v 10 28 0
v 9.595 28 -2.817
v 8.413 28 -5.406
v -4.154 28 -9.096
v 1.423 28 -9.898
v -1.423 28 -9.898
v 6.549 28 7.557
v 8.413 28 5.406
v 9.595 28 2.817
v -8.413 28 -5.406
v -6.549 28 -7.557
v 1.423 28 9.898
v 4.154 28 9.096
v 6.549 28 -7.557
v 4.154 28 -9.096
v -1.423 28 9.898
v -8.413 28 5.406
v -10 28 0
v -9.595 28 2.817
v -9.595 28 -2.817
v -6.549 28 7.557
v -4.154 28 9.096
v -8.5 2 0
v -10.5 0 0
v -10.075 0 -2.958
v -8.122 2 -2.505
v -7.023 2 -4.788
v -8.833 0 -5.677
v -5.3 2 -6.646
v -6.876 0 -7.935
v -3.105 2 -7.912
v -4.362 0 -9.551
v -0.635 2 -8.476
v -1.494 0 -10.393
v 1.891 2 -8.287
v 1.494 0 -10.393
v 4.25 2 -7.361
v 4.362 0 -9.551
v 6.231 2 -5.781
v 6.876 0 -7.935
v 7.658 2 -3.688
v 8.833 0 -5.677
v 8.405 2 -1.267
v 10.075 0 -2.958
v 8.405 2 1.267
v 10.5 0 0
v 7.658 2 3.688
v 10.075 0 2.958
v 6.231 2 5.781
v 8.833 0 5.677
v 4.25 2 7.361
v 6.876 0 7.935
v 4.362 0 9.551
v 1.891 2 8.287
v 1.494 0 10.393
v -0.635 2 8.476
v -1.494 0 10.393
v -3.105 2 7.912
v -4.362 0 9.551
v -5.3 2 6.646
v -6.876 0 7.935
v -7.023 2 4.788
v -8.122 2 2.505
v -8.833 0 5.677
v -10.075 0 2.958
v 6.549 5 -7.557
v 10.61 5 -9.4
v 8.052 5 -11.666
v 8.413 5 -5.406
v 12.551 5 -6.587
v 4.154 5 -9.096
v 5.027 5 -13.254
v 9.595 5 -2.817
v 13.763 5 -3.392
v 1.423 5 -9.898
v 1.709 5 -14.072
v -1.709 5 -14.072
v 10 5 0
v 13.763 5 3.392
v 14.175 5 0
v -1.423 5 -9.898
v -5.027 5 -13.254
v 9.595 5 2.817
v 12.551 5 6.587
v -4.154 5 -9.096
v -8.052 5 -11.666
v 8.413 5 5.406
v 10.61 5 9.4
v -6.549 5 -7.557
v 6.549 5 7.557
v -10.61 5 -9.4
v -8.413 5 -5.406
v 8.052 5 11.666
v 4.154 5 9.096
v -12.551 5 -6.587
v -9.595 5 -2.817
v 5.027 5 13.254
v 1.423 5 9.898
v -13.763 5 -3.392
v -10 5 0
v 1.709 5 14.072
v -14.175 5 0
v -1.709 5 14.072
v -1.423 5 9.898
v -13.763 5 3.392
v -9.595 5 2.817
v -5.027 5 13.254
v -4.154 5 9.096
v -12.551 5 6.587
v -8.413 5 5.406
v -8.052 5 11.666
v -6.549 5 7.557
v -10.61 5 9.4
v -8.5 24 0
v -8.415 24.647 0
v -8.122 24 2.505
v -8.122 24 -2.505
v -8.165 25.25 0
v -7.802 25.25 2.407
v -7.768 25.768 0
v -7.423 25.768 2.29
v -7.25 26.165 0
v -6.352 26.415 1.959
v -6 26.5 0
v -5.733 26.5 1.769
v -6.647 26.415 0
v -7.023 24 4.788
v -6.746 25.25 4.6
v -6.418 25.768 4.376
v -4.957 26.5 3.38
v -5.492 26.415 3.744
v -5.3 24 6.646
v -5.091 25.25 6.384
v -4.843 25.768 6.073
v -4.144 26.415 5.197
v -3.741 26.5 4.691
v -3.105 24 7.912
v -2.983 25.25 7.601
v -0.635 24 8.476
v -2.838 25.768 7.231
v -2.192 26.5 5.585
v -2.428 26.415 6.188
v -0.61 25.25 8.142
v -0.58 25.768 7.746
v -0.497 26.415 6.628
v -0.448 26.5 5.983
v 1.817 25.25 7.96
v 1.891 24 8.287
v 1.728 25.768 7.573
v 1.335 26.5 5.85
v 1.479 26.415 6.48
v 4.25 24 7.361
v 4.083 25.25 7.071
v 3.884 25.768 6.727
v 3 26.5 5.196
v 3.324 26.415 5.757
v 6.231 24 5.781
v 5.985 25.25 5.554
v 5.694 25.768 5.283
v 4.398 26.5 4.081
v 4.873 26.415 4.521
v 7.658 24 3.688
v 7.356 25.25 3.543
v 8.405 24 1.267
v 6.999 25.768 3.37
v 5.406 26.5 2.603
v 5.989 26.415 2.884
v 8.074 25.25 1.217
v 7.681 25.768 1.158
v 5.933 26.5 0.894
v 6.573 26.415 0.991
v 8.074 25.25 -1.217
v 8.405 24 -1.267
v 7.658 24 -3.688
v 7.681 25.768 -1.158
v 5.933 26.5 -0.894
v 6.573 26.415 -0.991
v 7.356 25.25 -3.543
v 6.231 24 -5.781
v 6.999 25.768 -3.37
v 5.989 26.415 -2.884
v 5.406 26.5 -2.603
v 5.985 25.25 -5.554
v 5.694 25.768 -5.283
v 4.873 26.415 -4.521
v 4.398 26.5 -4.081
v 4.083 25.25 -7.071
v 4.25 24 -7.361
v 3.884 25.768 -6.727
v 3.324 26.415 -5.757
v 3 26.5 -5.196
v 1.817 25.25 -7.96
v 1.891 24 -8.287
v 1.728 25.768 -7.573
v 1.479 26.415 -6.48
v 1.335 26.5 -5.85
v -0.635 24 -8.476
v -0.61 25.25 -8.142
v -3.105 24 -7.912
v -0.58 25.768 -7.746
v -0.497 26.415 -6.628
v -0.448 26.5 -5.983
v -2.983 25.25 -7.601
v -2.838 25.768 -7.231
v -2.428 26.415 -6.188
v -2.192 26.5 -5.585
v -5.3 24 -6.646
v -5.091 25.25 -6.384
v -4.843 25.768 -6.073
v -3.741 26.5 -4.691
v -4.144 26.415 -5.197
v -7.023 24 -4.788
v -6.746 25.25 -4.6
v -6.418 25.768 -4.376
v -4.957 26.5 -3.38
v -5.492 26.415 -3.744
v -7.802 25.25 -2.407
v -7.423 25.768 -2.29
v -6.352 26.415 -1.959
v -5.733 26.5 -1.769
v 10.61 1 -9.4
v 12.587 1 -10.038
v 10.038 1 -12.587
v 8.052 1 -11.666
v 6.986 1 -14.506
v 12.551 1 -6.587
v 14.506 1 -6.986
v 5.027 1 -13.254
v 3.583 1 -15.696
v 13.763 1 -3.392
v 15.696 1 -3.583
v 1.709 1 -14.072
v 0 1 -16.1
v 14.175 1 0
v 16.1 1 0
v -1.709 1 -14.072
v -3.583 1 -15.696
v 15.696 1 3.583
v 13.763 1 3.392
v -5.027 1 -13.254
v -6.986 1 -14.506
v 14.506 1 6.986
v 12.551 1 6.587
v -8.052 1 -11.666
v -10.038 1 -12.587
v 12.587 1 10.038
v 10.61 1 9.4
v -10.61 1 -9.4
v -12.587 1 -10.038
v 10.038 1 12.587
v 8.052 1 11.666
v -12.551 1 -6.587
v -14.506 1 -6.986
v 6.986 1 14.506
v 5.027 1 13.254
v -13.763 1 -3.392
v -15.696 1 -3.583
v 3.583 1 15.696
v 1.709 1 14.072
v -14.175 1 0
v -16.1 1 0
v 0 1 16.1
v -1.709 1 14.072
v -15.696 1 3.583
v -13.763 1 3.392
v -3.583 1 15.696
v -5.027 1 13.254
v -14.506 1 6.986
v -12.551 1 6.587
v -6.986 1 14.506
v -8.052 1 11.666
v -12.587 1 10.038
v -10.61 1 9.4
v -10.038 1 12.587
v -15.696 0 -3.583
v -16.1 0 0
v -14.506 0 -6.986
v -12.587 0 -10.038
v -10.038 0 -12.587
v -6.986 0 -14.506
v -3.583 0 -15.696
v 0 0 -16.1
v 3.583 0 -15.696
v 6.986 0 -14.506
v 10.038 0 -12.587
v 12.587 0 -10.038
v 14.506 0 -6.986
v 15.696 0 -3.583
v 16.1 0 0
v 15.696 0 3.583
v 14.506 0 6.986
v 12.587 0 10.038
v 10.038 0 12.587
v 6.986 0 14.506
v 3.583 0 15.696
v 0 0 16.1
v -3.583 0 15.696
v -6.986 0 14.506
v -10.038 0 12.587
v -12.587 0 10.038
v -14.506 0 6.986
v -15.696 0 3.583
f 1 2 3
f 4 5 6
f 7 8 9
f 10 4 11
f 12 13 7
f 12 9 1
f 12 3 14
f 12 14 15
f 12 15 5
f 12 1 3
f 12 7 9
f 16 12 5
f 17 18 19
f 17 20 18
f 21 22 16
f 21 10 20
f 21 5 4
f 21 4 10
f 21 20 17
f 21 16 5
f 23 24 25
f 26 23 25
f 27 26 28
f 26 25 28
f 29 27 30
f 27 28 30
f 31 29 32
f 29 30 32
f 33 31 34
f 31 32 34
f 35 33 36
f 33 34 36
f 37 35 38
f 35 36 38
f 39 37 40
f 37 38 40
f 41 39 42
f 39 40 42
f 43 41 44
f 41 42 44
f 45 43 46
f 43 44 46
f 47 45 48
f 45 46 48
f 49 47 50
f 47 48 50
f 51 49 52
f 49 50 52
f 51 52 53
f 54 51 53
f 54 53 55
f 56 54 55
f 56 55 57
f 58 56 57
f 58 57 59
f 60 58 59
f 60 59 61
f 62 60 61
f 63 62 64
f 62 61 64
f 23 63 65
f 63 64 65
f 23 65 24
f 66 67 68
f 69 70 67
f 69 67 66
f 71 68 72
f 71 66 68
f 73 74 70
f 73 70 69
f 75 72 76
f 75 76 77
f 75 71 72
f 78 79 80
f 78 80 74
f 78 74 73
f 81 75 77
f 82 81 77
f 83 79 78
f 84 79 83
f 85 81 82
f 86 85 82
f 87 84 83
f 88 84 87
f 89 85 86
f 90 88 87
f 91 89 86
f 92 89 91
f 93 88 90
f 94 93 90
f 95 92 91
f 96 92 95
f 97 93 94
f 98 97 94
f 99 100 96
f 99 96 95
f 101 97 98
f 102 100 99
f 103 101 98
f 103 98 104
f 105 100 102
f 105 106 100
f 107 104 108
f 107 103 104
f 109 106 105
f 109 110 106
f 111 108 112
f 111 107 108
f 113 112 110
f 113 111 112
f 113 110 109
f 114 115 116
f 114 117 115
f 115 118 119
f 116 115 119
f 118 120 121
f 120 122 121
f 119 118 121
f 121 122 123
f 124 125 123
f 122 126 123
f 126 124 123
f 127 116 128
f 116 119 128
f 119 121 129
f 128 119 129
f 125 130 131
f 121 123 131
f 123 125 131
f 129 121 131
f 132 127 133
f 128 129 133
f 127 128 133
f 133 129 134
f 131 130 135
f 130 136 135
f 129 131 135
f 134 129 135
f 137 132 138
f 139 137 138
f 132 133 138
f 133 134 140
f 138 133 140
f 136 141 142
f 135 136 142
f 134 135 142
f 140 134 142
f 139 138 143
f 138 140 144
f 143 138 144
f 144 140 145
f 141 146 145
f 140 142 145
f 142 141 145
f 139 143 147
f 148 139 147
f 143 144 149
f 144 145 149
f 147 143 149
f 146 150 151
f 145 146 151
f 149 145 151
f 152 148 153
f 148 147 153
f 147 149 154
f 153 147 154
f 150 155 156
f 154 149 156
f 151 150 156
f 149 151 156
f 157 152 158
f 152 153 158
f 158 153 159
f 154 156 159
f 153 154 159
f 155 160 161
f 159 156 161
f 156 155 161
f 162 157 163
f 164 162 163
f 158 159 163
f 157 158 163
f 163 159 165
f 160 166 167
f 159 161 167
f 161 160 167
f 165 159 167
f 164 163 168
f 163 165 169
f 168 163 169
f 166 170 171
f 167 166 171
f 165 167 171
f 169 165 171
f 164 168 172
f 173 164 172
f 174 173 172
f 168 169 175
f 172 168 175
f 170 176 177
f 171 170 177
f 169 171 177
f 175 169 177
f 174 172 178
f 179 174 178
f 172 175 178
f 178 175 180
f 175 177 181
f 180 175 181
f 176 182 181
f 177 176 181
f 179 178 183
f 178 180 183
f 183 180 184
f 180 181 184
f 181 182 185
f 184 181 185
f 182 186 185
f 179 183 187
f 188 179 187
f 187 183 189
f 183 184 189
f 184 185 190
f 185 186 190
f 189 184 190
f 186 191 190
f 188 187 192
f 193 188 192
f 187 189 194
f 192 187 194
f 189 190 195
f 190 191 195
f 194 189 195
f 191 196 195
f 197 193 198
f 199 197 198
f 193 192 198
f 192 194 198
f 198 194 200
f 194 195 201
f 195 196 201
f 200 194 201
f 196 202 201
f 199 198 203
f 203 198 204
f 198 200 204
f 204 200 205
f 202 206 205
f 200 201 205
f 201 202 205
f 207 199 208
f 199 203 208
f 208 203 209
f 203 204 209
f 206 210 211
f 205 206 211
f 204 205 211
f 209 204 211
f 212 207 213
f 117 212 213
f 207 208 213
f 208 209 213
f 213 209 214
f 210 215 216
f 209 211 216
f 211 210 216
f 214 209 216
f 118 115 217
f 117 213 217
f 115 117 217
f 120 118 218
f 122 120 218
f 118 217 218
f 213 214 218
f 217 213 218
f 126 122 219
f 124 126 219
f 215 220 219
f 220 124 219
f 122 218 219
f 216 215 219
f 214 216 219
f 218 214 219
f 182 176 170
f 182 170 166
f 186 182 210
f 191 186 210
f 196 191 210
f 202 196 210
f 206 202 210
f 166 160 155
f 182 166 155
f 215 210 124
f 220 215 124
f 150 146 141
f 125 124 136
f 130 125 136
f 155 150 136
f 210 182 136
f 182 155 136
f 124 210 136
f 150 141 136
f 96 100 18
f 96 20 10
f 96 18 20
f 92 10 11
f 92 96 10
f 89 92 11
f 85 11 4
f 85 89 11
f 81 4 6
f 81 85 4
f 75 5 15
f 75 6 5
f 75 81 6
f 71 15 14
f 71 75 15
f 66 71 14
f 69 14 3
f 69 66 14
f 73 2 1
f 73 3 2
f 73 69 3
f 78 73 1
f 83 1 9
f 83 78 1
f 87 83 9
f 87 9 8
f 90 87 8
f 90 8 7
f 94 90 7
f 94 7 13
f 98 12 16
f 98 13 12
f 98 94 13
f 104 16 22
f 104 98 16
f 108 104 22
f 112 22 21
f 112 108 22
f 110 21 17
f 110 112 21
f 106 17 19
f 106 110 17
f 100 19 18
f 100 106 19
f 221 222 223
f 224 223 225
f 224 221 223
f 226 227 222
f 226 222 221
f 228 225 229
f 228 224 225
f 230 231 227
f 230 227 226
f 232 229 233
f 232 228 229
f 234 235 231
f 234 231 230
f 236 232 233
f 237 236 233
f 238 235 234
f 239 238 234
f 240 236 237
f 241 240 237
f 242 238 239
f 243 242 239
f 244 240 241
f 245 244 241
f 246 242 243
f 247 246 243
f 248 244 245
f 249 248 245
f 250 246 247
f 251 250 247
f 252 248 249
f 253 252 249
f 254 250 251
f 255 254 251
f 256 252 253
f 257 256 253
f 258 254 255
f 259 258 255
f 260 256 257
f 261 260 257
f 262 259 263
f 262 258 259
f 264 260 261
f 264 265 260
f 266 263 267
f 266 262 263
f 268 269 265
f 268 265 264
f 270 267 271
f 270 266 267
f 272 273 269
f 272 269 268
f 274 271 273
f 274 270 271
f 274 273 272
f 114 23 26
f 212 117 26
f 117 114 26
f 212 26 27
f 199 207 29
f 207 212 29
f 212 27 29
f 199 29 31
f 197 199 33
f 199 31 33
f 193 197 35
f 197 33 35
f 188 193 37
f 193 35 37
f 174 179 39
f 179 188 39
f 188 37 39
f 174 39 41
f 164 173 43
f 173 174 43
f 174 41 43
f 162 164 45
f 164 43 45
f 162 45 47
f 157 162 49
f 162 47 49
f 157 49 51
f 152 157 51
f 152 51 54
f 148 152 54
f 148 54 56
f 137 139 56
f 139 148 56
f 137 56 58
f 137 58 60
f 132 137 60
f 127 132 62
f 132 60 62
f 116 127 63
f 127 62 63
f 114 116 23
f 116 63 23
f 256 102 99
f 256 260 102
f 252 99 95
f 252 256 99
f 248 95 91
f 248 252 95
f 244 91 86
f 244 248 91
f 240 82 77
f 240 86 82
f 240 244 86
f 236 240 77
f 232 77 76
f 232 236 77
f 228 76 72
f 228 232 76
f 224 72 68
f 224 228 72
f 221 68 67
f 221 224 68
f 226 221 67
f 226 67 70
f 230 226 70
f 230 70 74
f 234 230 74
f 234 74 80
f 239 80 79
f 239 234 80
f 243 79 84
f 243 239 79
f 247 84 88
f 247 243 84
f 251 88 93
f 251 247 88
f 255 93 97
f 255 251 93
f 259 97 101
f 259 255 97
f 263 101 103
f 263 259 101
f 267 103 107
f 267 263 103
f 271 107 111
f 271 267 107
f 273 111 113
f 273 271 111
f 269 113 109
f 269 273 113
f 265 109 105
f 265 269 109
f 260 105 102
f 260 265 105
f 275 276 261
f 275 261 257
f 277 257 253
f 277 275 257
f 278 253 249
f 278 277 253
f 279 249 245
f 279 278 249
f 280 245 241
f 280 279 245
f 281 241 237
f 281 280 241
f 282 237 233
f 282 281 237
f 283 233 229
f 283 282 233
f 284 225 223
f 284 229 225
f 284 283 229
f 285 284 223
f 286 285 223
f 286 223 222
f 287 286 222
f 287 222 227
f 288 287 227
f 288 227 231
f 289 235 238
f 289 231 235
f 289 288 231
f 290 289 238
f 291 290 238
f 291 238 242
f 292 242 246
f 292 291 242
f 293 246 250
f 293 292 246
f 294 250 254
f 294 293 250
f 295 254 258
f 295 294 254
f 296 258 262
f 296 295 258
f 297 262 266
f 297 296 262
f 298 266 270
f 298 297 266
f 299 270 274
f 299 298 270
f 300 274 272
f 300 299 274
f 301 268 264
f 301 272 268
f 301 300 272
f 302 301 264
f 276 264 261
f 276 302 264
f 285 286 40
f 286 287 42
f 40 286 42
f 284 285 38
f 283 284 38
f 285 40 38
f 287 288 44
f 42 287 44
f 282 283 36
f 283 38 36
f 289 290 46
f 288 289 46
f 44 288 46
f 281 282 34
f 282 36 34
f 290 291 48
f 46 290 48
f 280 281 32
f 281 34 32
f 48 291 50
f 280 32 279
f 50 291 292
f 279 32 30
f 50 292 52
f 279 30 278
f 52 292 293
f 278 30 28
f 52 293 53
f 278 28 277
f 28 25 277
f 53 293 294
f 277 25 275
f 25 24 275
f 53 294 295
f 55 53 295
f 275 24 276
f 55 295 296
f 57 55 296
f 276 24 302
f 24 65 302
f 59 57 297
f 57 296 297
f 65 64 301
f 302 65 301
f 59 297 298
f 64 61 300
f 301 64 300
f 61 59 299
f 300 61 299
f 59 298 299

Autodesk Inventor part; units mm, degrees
ref_plane "YZ Plane" through (0, 0, 0) normal (1, 0, 0) x (0, 1, 0)
ref_plane "XZ Plane" through (0, 0, 0) normal (0, 1, 0) x (-1, 0, 0)
ref_plane "XY Plane" through (0, 0, 0) normal (0, 0, 1) x (1, 0, 0)
sketch "Náčrt1" plane through (0, 0, 0) normal (0, 1, 0) x (-1, 0, 0)
  circle A0 centre (0, 0) radius 16.1
  circle A1 centre (0, 0) radius 14.175
  circle A2 centre (0, 0) radius 10
  circle A3 centre (0, 0) radius 8.5
  dimension "d0" = 32.2
  dimension "d1" = 28.35
  dimension "d2" = 20
  dimension "d3" = 1.5
extrude "Vysunutí1" add sketch "Náčrt1" along normal blind 1 contours A0
extrude "Vysunutí2" add sketch "Náčrt1" along normal blind 5 contours A1
extrude "Vysunutí3" add sketch "Náčrt1" along normal blind 28 contours A2 | A3
extrude "Vysunutí4" cut sketch "Náčrt1" along normal blind 26.5 contours A3
fillet "Zaoblení1" radius 2.5 1 edges at (8.5, 26.5, 0)
chamfer "Zkosení1" distance 2 angle 45 1 edges at (8.5, 0, 0)
properties part number "D28 - Forma"
